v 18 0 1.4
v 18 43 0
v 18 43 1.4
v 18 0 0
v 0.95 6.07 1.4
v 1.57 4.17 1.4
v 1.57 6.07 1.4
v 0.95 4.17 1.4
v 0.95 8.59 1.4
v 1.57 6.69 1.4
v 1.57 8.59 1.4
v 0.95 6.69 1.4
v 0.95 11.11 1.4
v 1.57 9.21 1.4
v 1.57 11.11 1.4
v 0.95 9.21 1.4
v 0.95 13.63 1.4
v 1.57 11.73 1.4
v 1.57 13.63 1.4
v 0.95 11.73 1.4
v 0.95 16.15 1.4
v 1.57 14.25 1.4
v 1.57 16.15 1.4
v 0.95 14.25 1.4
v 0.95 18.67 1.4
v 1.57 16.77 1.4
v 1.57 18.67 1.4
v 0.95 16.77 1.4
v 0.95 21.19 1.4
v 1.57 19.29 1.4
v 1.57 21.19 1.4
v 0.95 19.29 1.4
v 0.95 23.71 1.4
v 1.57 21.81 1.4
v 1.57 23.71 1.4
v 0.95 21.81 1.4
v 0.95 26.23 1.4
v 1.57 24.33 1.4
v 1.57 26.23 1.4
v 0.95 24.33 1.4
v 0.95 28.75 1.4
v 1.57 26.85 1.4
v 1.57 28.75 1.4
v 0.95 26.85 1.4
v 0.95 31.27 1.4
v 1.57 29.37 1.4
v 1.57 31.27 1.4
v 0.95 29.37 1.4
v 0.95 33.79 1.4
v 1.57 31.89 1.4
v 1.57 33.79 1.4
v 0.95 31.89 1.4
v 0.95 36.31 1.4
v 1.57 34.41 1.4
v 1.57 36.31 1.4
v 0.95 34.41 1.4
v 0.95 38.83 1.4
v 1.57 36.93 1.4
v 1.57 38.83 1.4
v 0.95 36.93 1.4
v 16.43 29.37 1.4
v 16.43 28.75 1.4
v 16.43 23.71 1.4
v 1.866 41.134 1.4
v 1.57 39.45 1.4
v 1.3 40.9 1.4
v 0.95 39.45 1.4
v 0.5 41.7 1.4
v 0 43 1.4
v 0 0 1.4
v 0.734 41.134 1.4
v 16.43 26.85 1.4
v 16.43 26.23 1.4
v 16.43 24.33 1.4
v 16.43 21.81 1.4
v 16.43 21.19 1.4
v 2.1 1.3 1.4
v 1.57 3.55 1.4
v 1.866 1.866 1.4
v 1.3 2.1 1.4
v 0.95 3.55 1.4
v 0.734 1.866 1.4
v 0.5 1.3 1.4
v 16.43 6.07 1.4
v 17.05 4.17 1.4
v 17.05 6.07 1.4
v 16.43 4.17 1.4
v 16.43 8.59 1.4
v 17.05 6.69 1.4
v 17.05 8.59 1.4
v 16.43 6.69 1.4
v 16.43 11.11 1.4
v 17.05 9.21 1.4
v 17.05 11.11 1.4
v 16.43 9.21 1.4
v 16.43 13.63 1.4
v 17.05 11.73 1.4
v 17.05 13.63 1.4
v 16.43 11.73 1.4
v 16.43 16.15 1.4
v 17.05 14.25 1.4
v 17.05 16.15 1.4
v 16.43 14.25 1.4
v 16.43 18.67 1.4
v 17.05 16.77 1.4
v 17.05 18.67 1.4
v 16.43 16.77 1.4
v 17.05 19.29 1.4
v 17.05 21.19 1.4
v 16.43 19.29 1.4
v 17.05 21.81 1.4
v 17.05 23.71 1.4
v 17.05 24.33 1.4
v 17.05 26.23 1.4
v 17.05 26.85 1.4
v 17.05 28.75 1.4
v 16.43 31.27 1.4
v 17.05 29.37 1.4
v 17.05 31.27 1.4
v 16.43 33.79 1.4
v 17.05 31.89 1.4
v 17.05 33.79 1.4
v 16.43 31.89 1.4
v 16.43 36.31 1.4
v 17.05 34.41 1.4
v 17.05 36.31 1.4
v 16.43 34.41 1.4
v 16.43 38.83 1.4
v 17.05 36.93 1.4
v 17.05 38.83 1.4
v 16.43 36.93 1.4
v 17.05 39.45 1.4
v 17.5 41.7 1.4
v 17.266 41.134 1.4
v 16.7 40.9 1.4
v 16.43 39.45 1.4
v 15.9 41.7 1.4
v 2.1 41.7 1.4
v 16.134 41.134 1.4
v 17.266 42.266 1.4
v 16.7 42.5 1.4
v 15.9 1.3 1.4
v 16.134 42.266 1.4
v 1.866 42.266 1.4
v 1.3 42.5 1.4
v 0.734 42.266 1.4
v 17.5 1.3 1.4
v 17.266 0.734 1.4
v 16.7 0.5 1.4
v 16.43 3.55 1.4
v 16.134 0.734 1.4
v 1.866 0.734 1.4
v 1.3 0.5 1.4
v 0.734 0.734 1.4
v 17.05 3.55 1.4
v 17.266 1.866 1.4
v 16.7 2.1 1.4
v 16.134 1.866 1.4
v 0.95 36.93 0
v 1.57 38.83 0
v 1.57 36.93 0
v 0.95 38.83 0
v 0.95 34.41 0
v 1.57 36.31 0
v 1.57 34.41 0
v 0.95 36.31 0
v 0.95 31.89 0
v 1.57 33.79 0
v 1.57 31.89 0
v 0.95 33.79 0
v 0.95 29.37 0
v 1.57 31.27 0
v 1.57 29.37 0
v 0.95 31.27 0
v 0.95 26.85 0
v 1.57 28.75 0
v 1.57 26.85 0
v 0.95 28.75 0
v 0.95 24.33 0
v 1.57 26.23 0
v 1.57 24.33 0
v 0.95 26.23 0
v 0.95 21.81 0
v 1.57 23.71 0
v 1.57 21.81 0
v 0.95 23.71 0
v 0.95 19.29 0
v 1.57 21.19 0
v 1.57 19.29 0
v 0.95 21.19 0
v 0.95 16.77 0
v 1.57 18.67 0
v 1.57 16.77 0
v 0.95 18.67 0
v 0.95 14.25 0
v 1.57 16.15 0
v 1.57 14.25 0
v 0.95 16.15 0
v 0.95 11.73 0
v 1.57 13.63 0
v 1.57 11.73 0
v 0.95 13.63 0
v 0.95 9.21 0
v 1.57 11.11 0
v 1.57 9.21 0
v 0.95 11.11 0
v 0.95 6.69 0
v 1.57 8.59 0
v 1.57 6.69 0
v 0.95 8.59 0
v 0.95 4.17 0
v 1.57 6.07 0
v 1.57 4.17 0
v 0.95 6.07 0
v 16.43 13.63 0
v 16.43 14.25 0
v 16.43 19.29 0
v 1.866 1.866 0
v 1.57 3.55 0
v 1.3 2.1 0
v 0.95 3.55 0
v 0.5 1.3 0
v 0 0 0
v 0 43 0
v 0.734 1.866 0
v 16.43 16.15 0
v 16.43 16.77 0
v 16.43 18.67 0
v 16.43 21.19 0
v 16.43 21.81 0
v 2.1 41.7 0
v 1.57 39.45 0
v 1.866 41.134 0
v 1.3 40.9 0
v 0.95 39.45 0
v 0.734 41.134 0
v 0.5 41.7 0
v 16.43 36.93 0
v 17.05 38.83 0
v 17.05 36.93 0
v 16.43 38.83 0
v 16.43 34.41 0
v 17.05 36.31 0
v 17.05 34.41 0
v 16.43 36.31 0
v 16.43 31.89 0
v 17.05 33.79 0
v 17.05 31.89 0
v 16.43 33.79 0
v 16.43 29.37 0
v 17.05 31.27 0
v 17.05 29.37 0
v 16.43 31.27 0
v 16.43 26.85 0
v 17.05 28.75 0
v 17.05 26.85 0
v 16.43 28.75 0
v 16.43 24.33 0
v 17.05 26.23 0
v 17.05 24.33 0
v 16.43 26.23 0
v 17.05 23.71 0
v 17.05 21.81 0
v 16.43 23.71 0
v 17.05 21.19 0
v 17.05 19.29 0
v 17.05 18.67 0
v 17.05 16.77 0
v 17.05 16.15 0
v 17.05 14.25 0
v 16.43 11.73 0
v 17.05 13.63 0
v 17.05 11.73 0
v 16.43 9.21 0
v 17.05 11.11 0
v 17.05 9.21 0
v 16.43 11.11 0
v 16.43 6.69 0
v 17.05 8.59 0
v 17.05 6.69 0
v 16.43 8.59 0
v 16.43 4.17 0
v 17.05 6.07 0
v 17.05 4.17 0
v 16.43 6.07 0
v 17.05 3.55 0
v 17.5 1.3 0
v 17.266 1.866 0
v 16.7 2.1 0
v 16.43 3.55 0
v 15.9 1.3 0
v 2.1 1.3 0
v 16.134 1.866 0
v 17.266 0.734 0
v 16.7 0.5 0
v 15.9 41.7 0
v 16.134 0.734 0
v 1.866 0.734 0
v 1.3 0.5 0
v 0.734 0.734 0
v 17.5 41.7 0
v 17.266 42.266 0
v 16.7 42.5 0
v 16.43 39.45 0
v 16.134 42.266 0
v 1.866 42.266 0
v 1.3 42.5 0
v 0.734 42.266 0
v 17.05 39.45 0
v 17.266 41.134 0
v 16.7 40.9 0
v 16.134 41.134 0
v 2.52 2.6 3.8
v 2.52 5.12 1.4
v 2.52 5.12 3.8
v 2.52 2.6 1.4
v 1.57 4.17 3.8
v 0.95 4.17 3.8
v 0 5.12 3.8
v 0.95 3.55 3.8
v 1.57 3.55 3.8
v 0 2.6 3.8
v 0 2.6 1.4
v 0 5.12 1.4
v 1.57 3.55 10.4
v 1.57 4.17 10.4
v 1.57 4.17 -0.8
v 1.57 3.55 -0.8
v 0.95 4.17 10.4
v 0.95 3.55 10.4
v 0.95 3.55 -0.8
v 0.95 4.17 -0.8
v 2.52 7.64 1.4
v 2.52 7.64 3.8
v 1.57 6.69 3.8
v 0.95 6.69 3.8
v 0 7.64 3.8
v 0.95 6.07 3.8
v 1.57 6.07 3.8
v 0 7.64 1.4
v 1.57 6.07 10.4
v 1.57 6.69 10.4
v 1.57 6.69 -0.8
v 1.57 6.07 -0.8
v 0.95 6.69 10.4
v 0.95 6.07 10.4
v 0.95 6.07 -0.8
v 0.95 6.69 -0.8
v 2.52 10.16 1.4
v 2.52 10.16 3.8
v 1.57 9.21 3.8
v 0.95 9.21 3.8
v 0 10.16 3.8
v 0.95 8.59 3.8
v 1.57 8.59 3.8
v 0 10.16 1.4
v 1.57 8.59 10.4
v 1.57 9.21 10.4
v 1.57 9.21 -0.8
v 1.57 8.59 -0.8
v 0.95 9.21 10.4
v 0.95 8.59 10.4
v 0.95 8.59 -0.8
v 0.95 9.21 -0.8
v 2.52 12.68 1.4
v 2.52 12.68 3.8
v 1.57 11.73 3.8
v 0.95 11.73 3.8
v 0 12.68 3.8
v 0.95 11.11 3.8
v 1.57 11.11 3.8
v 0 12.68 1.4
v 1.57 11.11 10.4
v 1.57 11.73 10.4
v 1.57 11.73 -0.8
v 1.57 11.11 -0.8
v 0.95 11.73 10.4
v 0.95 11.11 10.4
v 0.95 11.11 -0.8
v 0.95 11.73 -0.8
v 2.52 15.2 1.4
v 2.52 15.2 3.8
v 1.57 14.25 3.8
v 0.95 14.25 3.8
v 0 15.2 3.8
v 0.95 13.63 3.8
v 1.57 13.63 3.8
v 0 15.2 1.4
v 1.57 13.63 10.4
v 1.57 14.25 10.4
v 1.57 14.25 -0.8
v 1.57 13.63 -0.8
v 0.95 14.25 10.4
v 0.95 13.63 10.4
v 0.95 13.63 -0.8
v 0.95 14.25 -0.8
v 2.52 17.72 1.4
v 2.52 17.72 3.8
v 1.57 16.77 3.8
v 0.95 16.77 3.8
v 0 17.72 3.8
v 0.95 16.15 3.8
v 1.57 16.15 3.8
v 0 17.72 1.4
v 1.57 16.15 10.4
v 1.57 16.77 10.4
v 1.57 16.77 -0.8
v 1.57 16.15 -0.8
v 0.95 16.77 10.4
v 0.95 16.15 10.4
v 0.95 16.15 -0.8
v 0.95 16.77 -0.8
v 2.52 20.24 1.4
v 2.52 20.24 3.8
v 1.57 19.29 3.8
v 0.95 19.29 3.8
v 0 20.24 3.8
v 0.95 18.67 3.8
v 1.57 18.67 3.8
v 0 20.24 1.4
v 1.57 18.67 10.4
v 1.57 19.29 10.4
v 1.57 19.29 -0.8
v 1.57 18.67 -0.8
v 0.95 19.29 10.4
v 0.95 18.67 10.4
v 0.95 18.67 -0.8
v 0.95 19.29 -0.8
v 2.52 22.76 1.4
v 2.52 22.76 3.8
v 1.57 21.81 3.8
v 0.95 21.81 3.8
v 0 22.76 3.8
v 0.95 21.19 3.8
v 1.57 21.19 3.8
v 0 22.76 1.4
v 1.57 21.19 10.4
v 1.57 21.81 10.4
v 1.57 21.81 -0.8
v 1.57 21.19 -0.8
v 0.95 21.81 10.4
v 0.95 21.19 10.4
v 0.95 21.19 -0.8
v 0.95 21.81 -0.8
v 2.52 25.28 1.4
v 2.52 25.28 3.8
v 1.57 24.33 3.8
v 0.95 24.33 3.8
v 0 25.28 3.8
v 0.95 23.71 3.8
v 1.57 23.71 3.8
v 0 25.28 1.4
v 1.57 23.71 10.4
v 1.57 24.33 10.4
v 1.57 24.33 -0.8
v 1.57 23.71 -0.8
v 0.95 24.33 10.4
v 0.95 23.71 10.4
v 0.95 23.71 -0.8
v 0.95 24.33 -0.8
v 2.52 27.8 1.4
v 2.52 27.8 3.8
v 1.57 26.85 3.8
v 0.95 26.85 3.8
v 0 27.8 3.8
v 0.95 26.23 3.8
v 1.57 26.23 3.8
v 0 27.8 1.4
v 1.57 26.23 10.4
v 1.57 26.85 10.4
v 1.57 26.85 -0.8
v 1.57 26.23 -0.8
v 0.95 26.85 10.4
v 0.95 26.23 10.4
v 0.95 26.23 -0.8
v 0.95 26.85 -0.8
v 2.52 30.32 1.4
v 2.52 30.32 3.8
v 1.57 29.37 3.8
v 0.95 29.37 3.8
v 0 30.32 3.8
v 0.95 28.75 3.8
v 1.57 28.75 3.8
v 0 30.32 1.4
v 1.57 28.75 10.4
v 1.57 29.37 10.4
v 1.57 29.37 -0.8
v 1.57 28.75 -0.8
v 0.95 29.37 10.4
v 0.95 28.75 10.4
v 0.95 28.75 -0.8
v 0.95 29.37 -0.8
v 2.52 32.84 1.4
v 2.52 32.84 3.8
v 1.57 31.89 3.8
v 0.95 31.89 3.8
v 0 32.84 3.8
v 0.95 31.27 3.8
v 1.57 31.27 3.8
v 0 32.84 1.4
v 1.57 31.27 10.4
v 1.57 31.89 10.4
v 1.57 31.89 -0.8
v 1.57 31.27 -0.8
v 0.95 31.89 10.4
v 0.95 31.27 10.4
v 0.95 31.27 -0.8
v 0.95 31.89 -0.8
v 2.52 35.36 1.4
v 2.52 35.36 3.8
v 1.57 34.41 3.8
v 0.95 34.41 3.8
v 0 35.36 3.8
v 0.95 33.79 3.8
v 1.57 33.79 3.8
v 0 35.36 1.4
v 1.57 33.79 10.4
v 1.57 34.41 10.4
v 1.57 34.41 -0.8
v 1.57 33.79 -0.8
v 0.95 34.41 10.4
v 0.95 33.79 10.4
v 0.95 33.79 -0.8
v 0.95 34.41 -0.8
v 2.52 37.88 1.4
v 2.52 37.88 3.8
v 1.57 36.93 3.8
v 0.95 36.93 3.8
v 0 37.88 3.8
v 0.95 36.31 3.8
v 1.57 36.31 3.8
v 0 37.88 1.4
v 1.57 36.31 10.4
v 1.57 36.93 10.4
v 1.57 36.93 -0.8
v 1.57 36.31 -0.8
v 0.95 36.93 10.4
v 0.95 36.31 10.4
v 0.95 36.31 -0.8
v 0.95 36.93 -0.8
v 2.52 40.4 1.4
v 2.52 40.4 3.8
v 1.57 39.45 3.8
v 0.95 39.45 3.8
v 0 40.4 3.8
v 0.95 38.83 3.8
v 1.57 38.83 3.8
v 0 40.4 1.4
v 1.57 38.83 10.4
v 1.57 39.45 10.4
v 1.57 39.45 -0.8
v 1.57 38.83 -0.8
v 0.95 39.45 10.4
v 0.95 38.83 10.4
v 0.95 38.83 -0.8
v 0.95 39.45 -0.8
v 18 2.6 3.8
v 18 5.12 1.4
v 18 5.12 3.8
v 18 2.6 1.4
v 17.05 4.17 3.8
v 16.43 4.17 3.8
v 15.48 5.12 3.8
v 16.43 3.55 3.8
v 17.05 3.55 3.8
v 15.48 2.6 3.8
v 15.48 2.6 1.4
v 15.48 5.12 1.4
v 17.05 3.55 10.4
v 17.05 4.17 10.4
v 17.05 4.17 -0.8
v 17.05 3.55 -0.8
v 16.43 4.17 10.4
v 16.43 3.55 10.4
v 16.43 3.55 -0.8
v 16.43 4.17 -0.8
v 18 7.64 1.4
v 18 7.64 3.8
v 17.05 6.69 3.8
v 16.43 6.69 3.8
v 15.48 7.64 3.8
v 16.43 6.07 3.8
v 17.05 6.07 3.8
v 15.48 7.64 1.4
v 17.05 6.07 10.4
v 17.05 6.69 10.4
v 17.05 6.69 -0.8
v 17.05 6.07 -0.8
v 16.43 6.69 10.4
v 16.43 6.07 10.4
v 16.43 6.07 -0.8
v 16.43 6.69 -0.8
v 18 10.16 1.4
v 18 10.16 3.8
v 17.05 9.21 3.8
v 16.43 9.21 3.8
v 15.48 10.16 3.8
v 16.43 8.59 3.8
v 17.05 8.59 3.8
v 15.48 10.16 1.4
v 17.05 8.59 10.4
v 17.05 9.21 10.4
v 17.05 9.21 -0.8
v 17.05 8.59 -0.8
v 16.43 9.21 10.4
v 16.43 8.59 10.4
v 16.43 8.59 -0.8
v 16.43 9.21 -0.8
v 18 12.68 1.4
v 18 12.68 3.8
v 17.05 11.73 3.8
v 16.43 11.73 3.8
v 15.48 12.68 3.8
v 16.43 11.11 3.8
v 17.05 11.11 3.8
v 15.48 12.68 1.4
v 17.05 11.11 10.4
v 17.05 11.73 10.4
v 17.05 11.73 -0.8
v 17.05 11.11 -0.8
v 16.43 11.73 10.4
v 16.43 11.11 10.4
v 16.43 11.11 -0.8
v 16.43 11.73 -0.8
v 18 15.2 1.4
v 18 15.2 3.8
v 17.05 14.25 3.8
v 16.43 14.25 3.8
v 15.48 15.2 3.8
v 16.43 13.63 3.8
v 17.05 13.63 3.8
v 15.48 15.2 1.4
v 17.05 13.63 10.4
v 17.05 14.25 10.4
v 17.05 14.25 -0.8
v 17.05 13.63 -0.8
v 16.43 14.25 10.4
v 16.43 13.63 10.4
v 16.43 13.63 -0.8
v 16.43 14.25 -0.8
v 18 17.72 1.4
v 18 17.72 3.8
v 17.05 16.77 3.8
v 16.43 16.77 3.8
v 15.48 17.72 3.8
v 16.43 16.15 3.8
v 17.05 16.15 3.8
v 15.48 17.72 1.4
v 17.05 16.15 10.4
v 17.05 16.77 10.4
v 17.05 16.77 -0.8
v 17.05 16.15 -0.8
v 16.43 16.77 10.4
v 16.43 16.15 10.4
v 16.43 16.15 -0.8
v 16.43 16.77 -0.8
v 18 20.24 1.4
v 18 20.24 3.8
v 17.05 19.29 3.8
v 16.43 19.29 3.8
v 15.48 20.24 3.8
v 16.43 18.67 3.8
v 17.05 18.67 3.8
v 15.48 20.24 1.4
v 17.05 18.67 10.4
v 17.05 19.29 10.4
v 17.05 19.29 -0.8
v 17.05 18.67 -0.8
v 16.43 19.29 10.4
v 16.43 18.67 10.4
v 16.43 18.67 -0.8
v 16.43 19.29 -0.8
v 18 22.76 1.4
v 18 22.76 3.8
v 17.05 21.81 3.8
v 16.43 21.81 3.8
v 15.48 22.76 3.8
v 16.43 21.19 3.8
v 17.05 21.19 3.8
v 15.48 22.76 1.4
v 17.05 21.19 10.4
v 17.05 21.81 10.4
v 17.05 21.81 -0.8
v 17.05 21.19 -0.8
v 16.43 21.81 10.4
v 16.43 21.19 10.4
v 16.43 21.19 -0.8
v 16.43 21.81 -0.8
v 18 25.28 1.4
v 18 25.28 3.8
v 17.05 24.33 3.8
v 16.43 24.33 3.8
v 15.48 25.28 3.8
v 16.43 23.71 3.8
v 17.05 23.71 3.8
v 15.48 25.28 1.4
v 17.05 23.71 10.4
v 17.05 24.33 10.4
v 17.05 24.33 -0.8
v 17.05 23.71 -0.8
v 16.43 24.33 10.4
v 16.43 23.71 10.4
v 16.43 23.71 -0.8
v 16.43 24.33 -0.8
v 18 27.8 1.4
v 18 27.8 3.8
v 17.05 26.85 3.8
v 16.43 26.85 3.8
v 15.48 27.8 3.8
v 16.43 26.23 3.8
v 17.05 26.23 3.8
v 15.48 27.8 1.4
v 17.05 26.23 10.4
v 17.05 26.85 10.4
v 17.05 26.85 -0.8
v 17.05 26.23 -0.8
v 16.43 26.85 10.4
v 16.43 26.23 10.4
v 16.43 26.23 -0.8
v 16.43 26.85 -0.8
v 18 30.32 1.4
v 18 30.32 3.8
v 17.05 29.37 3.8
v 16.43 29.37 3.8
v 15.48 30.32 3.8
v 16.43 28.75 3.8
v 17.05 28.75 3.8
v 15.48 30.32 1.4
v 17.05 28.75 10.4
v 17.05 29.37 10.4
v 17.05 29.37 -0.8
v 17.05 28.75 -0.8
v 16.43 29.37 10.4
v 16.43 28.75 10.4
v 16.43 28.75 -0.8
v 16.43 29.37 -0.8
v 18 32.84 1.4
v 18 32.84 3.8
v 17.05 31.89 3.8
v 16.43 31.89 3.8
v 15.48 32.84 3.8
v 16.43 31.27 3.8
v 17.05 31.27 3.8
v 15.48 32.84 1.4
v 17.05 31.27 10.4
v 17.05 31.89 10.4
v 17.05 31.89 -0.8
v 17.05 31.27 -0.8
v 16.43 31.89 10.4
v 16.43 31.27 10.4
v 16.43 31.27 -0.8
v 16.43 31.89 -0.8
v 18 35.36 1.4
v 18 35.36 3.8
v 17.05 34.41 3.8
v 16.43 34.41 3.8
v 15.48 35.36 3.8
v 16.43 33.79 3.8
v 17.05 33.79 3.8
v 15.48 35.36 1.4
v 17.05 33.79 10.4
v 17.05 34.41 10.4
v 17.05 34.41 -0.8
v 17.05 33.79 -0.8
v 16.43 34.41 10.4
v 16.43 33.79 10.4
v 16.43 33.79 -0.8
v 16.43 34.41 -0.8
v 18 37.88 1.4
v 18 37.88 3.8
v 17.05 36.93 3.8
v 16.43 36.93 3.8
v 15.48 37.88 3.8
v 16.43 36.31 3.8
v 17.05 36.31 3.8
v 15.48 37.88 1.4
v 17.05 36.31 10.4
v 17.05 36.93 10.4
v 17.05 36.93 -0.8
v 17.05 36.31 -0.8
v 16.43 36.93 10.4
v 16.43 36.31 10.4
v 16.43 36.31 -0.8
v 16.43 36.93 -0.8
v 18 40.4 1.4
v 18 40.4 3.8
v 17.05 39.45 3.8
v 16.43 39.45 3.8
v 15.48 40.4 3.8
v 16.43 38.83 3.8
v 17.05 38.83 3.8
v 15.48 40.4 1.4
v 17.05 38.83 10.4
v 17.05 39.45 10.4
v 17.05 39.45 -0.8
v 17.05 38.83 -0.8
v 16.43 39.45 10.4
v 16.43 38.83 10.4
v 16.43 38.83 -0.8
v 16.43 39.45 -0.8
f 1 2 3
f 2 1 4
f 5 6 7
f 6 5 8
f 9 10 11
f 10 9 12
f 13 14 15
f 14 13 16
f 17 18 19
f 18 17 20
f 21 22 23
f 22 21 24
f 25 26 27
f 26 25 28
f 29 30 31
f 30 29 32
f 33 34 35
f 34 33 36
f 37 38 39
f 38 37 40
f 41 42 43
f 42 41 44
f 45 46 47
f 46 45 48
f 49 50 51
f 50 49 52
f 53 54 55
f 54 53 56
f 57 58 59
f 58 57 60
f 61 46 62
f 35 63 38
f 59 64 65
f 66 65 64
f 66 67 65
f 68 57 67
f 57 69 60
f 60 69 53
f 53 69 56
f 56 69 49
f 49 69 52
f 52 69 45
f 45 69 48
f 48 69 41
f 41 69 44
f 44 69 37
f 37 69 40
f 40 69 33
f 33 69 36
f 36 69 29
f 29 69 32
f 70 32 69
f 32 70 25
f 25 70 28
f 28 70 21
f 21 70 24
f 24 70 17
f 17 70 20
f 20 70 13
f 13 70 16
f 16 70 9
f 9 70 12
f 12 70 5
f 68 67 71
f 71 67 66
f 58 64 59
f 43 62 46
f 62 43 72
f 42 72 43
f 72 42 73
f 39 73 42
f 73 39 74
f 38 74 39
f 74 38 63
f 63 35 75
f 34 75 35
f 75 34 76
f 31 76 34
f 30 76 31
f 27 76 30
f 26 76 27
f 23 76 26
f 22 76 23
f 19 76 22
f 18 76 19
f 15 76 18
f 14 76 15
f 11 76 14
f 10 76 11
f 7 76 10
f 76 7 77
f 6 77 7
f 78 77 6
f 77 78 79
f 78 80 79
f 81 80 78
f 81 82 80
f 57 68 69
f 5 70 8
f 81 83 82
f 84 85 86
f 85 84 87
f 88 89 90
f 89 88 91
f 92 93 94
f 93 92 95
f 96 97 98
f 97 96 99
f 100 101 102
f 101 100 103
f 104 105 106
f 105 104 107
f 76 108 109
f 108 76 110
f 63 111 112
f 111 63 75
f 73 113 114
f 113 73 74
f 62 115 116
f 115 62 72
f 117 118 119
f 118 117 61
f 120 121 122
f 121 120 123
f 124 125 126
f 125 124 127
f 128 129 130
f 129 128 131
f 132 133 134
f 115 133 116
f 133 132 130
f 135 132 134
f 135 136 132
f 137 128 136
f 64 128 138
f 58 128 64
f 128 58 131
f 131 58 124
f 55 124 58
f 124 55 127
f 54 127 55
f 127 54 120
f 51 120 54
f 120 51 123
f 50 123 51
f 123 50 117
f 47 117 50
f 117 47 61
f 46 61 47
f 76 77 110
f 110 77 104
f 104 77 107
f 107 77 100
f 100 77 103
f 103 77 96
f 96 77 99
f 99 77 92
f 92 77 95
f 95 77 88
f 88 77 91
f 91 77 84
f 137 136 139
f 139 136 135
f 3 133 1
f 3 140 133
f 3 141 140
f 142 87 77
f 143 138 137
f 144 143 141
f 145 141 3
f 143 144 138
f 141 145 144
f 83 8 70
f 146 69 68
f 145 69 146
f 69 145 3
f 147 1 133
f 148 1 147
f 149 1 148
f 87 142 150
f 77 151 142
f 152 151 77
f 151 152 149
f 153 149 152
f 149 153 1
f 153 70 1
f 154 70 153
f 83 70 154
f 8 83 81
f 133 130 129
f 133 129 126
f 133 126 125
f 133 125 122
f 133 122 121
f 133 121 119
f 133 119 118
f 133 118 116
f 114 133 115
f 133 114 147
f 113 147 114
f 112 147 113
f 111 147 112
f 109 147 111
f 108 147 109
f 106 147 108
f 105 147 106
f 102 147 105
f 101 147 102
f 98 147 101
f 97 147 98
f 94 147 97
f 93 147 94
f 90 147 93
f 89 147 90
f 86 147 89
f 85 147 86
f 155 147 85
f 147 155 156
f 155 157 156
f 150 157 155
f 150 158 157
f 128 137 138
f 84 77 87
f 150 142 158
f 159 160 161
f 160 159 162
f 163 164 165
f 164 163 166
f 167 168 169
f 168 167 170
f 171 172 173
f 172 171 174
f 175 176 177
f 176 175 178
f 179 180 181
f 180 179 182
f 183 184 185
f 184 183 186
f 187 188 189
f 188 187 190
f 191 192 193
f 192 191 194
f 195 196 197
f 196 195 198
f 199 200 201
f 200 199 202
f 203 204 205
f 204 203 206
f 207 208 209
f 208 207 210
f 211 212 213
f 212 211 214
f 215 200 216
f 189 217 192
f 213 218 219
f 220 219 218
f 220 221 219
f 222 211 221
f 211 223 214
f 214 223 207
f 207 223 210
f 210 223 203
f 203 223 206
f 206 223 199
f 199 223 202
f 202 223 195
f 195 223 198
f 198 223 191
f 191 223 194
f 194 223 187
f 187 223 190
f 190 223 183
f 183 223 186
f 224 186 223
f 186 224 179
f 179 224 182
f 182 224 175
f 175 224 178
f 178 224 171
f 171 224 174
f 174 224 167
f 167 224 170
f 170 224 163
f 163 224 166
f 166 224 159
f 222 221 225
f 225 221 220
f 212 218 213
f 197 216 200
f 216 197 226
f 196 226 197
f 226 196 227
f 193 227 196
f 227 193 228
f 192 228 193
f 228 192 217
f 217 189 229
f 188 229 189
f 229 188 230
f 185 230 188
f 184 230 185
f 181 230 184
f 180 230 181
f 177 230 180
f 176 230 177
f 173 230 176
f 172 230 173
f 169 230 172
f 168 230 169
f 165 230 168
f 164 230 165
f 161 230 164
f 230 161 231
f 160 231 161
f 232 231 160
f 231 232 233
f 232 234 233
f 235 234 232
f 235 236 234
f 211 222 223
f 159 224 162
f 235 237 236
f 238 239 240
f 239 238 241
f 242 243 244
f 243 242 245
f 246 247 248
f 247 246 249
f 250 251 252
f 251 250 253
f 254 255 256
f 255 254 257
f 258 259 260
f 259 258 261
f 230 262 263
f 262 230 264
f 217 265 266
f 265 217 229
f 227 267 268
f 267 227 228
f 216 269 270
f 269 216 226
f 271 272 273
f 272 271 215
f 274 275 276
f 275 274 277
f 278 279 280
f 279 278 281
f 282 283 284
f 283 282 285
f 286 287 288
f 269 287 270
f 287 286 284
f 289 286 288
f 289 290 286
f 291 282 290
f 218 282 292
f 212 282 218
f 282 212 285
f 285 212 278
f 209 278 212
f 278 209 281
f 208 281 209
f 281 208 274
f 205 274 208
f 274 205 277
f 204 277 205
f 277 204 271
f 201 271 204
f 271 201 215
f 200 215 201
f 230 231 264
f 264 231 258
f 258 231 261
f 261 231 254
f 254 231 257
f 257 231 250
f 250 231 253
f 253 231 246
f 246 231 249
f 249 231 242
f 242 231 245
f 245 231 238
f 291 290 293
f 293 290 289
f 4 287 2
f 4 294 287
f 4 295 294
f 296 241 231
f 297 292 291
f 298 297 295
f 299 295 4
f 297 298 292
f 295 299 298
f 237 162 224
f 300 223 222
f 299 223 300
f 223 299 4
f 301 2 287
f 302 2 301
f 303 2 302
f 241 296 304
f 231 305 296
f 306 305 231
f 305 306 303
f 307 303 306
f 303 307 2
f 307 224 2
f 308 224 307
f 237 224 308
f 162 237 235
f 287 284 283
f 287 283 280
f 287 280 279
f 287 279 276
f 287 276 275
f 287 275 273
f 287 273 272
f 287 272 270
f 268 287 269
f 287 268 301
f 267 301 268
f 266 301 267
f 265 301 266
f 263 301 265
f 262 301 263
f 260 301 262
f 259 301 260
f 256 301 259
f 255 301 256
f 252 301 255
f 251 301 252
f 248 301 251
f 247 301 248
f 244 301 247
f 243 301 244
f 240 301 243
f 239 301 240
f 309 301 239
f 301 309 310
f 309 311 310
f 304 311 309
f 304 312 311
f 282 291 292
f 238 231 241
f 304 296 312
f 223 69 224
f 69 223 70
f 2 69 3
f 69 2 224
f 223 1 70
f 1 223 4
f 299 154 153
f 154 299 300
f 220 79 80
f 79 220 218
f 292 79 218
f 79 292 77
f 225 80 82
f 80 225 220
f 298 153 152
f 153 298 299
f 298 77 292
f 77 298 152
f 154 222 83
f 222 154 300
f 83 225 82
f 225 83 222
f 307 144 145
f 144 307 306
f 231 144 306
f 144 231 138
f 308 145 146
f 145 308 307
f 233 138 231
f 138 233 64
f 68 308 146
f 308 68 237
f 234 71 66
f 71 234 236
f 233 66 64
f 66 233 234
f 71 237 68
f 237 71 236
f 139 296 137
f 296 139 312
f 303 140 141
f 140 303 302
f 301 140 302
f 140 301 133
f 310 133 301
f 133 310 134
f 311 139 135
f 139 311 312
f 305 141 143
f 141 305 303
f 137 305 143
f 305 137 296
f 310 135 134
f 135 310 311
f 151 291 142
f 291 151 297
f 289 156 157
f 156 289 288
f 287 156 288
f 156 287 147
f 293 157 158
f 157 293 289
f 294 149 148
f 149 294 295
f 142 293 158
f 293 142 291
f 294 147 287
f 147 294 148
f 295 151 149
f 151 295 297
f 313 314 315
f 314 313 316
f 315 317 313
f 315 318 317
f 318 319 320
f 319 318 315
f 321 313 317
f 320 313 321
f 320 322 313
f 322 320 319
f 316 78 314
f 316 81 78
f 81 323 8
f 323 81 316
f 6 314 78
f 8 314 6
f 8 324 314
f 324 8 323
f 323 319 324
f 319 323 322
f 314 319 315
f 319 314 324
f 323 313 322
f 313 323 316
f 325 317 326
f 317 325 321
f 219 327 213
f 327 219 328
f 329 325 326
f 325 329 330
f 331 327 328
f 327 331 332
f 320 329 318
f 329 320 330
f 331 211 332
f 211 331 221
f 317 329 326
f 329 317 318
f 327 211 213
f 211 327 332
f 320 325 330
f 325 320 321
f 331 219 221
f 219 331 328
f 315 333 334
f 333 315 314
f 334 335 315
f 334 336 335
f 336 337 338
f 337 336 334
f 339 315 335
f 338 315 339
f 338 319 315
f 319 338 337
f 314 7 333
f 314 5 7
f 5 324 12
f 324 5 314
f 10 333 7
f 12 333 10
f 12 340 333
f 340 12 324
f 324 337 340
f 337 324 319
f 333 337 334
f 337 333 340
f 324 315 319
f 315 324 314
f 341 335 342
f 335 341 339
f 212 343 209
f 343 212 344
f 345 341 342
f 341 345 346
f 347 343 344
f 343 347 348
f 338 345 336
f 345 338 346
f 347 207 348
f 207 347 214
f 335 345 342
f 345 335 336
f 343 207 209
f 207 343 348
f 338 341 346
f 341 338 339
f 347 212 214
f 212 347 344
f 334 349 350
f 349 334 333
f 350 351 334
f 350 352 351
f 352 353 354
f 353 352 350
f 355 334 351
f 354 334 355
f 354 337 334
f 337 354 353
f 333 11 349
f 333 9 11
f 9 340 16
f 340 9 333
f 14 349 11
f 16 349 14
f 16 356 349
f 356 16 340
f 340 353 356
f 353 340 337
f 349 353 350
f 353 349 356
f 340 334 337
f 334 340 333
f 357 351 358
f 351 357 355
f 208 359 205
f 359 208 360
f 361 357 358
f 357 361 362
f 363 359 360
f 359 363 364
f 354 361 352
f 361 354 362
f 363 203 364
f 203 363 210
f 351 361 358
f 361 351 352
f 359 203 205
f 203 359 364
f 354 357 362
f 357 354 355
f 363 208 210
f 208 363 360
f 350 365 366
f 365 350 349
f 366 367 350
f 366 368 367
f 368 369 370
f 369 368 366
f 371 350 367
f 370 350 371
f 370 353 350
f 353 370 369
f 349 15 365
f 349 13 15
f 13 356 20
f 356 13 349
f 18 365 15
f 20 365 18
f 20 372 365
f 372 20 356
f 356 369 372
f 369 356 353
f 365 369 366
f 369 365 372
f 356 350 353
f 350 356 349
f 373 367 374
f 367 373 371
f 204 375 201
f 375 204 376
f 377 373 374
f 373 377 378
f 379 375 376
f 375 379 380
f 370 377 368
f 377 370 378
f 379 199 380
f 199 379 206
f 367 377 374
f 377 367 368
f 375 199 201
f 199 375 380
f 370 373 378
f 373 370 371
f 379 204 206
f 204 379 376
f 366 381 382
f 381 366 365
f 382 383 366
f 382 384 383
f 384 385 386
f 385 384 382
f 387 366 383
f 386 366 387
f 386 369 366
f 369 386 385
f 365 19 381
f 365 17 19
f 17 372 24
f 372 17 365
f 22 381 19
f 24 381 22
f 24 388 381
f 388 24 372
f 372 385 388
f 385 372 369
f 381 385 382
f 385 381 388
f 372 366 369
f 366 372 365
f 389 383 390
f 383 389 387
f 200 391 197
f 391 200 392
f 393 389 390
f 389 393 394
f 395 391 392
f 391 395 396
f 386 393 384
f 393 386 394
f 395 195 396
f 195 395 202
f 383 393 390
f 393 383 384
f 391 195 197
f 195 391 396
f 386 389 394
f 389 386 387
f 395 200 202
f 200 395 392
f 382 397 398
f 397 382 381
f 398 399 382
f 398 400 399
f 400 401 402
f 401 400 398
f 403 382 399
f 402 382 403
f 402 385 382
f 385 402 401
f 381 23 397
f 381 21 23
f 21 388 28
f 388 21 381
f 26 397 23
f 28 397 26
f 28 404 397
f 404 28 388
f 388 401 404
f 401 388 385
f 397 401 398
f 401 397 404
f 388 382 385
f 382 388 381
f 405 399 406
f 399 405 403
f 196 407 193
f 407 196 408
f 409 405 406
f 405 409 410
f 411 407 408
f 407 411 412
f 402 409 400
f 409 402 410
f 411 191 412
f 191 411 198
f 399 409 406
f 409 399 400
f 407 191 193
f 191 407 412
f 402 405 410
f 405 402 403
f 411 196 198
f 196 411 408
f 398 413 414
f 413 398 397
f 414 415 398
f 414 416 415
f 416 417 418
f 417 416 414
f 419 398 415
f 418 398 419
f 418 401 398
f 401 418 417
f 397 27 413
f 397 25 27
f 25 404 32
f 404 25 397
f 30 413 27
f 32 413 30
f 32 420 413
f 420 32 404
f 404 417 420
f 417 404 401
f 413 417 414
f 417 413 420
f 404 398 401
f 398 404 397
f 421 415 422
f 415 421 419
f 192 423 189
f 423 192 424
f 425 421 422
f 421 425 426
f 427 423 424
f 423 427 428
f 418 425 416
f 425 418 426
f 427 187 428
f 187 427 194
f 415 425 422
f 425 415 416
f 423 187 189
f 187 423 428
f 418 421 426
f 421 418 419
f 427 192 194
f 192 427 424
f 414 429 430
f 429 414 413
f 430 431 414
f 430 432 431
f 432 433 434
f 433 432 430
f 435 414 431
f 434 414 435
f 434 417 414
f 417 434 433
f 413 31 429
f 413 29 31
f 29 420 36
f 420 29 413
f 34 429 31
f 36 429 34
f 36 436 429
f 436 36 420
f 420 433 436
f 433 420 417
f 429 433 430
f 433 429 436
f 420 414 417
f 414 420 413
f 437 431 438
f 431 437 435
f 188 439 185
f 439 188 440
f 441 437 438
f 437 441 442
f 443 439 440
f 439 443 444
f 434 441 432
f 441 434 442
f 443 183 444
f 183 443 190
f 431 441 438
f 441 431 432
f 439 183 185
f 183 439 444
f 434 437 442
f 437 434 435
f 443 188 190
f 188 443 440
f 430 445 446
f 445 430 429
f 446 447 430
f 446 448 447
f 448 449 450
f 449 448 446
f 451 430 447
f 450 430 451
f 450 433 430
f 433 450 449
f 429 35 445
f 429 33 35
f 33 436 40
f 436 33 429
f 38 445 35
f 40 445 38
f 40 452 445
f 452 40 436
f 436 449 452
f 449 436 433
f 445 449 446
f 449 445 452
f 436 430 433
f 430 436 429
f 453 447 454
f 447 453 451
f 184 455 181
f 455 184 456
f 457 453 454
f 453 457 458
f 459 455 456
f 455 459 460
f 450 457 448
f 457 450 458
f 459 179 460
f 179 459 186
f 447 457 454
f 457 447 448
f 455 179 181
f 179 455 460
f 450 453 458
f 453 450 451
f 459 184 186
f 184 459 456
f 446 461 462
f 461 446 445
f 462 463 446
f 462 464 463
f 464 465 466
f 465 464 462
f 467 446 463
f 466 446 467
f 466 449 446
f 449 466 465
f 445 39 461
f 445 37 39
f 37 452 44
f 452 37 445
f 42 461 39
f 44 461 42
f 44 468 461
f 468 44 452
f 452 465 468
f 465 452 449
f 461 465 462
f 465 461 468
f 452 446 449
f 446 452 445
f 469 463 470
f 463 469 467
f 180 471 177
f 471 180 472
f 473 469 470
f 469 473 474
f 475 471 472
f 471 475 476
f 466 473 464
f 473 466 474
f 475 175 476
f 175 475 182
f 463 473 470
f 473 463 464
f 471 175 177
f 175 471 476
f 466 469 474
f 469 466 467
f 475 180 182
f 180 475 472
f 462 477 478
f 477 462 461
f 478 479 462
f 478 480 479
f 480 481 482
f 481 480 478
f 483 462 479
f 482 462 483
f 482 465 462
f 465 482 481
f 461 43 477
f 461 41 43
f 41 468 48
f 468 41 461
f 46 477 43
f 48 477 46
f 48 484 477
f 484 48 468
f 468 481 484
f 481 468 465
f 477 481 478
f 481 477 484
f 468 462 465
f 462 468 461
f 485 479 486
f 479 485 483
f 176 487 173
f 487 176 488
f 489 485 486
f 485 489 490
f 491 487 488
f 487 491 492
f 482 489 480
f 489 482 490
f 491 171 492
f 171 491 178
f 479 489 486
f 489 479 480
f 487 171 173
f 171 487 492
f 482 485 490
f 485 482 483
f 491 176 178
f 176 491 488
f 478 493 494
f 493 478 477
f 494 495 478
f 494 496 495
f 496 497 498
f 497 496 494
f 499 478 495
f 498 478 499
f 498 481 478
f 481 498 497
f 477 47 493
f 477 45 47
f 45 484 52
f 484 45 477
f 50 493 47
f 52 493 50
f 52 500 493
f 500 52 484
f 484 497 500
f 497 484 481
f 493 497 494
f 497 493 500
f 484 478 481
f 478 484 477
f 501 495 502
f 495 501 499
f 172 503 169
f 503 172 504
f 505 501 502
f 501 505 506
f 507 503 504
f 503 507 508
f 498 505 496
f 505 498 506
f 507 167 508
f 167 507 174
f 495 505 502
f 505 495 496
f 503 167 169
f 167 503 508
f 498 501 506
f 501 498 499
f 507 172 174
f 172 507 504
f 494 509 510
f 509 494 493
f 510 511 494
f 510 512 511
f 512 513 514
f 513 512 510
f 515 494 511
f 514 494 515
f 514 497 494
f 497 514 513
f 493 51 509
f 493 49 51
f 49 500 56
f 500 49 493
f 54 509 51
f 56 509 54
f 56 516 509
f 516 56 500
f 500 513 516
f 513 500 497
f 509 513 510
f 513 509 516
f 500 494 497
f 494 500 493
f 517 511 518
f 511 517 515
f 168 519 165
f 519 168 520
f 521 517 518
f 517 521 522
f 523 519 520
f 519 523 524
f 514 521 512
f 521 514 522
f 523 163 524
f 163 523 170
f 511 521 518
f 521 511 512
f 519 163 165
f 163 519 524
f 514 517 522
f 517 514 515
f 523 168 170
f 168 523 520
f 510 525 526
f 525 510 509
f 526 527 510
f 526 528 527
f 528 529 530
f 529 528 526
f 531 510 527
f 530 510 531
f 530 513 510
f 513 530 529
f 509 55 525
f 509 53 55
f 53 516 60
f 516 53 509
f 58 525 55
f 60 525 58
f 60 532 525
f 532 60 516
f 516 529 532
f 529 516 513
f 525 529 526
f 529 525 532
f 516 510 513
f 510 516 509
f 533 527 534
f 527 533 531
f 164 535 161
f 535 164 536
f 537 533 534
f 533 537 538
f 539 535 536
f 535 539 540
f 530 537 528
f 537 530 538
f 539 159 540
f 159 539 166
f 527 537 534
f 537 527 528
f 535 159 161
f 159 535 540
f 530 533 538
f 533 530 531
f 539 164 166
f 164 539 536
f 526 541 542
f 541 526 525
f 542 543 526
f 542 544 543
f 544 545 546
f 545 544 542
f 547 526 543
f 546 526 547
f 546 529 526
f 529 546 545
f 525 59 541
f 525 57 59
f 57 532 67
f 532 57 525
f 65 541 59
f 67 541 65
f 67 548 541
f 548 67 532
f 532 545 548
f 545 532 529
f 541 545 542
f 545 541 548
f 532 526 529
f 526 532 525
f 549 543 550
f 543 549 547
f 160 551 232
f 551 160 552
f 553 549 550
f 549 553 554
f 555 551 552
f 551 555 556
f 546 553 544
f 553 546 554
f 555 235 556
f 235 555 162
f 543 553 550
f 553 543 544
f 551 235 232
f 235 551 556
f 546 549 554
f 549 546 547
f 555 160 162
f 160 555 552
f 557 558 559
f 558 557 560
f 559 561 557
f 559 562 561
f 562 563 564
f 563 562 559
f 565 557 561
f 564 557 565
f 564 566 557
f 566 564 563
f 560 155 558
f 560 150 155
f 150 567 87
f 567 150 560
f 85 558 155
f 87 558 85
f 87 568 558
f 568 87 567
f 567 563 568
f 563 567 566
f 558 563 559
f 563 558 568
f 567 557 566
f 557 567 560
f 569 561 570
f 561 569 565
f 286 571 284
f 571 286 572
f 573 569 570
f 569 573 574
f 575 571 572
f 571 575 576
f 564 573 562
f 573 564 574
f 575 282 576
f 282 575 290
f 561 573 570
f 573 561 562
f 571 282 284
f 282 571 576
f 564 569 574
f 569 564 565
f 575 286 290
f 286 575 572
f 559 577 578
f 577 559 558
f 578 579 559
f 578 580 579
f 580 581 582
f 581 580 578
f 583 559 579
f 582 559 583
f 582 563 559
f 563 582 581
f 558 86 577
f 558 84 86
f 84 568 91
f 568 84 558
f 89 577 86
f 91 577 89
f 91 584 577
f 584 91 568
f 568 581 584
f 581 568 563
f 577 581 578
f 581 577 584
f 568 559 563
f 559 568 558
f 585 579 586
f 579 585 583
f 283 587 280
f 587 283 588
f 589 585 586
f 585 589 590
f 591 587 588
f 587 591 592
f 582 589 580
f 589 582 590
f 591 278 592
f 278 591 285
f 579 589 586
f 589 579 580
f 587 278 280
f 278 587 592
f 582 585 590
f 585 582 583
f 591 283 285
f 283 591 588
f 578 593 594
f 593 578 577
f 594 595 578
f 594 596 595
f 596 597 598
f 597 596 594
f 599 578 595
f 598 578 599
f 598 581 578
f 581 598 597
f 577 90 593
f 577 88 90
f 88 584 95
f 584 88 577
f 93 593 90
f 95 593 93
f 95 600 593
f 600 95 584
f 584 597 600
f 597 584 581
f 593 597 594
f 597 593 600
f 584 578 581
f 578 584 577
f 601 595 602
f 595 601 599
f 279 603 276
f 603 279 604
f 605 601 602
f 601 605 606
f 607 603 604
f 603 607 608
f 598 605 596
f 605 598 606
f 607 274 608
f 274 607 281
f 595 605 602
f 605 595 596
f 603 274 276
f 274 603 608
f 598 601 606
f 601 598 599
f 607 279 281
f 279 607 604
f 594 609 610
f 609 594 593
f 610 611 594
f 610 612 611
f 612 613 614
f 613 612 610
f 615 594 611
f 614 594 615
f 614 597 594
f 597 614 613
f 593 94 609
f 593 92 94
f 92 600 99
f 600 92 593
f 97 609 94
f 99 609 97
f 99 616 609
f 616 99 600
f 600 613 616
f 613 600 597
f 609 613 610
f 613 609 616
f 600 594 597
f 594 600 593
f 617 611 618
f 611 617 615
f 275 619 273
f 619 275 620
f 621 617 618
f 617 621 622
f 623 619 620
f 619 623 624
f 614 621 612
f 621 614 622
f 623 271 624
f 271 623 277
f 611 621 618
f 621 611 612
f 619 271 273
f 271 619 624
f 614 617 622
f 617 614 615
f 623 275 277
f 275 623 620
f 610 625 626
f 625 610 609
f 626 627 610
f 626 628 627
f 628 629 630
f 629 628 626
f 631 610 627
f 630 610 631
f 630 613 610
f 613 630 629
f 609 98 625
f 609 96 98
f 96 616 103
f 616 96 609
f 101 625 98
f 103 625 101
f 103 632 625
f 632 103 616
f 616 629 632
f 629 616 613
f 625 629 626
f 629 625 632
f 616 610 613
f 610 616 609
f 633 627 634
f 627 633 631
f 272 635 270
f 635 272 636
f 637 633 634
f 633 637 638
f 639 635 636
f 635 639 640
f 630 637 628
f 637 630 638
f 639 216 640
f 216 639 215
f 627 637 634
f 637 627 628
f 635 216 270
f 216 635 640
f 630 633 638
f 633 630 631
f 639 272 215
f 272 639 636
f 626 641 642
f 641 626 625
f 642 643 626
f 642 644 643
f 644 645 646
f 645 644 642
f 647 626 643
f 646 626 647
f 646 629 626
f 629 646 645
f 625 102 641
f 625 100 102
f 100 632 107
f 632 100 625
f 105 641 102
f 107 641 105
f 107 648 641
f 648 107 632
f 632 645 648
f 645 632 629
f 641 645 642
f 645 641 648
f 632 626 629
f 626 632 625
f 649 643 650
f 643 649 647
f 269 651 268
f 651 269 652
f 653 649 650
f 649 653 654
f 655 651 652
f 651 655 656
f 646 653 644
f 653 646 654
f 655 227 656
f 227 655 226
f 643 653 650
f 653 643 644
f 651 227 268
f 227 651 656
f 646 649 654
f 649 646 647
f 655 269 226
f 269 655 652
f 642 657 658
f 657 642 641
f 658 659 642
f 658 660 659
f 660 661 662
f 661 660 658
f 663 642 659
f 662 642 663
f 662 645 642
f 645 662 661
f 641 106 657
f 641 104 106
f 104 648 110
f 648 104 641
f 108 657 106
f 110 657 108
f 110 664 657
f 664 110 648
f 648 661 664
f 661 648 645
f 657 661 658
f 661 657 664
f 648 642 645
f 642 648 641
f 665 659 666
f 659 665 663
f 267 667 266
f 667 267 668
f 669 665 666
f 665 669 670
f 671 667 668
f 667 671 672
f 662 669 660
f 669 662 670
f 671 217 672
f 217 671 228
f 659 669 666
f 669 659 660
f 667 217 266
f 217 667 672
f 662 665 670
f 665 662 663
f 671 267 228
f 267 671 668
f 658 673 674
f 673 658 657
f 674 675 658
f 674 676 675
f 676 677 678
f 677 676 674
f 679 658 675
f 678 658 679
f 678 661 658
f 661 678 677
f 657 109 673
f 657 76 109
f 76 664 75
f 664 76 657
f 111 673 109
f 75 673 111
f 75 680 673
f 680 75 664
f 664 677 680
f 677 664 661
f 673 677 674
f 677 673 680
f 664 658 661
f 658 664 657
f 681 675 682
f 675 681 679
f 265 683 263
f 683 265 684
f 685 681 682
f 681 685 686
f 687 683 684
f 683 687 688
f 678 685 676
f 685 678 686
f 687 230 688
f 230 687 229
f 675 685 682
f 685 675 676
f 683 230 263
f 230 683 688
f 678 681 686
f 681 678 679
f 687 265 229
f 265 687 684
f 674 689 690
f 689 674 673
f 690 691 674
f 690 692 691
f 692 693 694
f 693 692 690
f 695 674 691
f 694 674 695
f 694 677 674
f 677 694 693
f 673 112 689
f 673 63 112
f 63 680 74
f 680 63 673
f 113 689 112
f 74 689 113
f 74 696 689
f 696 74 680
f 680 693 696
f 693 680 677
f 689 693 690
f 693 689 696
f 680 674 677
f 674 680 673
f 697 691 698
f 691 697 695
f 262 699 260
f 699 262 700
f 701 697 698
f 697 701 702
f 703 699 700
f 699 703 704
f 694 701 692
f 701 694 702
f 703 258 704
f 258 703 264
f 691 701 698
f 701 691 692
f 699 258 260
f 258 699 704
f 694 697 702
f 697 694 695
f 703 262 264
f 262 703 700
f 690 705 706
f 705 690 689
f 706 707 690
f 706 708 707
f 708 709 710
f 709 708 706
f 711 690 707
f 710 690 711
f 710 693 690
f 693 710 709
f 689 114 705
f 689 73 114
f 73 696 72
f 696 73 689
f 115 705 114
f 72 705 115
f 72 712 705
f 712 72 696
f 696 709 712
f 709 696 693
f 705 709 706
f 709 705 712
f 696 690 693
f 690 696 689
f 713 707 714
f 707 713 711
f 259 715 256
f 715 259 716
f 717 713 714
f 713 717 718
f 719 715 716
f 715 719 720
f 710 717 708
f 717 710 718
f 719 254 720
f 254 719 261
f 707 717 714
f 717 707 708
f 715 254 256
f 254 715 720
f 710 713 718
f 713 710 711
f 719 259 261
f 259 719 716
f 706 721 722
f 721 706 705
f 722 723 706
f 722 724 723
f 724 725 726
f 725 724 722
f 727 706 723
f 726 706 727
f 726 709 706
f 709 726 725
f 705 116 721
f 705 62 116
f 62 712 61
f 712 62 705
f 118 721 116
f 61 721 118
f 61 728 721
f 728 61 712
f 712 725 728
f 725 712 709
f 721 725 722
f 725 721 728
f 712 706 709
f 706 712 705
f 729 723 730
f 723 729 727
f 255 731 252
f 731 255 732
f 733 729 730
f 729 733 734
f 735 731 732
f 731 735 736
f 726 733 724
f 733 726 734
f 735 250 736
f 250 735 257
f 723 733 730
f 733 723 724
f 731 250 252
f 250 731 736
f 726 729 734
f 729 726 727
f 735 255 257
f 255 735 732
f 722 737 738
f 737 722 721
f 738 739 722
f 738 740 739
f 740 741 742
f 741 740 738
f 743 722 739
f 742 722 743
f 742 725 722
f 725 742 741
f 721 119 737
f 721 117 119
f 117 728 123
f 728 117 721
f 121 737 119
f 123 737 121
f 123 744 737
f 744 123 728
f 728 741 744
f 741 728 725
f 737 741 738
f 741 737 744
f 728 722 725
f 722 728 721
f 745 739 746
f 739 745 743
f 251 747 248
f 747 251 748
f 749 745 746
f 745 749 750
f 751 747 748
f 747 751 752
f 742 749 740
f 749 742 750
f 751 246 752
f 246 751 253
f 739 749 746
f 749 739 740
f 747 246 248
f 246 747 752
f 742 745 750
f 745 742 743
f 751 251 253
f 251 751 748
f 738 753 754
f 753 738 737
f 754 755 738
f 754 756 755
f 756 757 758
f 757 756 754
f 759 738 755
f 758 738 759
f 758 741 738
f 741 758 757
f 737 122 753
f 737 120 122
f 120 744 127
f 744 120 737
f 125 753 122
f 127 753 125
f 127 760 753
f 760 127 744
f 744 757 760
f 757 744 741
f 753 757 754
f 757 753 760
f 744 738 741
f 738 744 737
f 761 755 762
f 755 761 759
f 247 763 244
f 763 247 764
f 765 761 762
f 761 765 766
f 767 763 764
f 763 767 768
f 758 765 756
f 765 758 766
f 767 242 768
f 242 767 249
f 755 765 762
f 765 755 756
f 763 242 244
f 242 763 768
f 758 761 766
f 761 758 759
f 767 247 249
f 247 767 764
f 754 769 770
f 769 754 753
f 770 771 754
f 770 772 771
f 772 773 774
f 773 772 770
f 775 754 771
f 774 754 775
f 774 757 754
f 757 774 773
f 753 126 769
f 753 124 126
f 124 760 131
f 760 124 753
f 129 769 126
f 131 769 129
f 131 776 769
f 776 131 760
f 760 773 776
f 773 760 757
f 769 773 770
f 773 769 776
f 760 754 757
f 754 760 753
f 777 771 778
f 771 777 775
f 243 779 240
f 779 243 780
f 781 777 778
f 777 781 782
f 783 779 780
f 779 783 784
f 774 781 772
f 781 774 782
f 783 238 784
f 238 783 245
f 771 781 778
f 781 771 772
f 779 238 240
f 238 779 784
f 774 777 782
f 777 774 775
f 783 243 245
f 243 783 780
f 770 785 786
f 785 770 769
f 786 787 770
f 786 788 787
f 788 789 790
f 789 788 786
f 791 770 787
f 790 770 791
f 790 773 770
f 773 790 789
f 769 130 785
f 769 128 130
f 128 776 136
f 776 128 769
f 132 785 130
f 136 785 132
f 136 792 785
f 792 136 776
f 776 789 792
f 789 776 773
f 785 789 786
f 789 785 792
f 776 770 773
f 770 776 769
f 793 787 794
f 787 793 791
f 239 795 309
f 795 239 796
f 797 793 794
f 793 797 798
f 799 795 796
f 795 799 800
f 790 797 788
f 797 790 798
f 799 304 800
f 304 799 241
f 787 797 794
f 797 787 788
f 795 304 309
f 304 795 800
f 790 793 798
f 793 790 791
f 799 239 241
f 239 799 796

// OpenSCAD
/* Loic - August 2017 - Arduino Nano Clone */

pcb_width = 18;
pcb_length = 43;
pcb_height = 1.4;

screwHole_radius = 0.8;
screwHole_margin = 0.5;
$fn=8;

  pin_height = 11.2;
  pin_width = 0.62;
  pin_short=5.4;
  
  tab_height = 2.4;
  tab_width = 2.52;

module pcb()
{
difference()
{
color("DarkBlue")
  cube([pcb_width,pcb_length,pcb_height]);

translate([screwHole_radius+screwHole_margin,screwHole_radius+screwHole_margin,-pcb_height/2])
  screwHole();
translate([screwHole_radius+screwHole_margin,pcb_length-screwHole_radius-screwHole_margin,-pcb_height/2])
  screwHole();
translate([pcb_width-screwHole_radius-screwHole_margin,pcb_length-screwHole_radius-screwHole_margin,-pcb_height/2])
  screwHole();
translate([pcb_width-screwHole_radius-screwHole_margin,screwHole_radius+screwHole_margin,-pcb_height/2])
  screwHole();
}
}

pcb();
//pin();

translate([tab_width/2,2.6+tab_width/2,pcb_height])
pins_rail(15);

  translate([pcb_width-tab_width/2,2.6+tab_width/2,pcb_height])
 pins_rail(15);

//rotate([0,0,90])
//isp_pins();

module isp_pins()
{
  translate([tab_width/2,0,pin_short/2-pcb_height])
  {
pins_rail(3);
  translate([tab_width,0,0])
pins_rail(3);
  }
}

module pins_rail(numbersOfPin)
{
  for (i=[0:numbersOfPin-1])
    translate([0,i*tab_width,0])
      pin();
}

module pin()
{
  translate([0,0,tab_height/2])
    color("black")
      cube([tab_width,tab_width,tab_height],true);
  
  translate([0,0,pin_height-pin_short-tab_height])
    color("gold")
      cube([pin_width,pin_width,pin_height],true);
}

module screwHole()
{
  cylinder(pcb_height*2,screwHole_radius,screwHole_radius);
}
